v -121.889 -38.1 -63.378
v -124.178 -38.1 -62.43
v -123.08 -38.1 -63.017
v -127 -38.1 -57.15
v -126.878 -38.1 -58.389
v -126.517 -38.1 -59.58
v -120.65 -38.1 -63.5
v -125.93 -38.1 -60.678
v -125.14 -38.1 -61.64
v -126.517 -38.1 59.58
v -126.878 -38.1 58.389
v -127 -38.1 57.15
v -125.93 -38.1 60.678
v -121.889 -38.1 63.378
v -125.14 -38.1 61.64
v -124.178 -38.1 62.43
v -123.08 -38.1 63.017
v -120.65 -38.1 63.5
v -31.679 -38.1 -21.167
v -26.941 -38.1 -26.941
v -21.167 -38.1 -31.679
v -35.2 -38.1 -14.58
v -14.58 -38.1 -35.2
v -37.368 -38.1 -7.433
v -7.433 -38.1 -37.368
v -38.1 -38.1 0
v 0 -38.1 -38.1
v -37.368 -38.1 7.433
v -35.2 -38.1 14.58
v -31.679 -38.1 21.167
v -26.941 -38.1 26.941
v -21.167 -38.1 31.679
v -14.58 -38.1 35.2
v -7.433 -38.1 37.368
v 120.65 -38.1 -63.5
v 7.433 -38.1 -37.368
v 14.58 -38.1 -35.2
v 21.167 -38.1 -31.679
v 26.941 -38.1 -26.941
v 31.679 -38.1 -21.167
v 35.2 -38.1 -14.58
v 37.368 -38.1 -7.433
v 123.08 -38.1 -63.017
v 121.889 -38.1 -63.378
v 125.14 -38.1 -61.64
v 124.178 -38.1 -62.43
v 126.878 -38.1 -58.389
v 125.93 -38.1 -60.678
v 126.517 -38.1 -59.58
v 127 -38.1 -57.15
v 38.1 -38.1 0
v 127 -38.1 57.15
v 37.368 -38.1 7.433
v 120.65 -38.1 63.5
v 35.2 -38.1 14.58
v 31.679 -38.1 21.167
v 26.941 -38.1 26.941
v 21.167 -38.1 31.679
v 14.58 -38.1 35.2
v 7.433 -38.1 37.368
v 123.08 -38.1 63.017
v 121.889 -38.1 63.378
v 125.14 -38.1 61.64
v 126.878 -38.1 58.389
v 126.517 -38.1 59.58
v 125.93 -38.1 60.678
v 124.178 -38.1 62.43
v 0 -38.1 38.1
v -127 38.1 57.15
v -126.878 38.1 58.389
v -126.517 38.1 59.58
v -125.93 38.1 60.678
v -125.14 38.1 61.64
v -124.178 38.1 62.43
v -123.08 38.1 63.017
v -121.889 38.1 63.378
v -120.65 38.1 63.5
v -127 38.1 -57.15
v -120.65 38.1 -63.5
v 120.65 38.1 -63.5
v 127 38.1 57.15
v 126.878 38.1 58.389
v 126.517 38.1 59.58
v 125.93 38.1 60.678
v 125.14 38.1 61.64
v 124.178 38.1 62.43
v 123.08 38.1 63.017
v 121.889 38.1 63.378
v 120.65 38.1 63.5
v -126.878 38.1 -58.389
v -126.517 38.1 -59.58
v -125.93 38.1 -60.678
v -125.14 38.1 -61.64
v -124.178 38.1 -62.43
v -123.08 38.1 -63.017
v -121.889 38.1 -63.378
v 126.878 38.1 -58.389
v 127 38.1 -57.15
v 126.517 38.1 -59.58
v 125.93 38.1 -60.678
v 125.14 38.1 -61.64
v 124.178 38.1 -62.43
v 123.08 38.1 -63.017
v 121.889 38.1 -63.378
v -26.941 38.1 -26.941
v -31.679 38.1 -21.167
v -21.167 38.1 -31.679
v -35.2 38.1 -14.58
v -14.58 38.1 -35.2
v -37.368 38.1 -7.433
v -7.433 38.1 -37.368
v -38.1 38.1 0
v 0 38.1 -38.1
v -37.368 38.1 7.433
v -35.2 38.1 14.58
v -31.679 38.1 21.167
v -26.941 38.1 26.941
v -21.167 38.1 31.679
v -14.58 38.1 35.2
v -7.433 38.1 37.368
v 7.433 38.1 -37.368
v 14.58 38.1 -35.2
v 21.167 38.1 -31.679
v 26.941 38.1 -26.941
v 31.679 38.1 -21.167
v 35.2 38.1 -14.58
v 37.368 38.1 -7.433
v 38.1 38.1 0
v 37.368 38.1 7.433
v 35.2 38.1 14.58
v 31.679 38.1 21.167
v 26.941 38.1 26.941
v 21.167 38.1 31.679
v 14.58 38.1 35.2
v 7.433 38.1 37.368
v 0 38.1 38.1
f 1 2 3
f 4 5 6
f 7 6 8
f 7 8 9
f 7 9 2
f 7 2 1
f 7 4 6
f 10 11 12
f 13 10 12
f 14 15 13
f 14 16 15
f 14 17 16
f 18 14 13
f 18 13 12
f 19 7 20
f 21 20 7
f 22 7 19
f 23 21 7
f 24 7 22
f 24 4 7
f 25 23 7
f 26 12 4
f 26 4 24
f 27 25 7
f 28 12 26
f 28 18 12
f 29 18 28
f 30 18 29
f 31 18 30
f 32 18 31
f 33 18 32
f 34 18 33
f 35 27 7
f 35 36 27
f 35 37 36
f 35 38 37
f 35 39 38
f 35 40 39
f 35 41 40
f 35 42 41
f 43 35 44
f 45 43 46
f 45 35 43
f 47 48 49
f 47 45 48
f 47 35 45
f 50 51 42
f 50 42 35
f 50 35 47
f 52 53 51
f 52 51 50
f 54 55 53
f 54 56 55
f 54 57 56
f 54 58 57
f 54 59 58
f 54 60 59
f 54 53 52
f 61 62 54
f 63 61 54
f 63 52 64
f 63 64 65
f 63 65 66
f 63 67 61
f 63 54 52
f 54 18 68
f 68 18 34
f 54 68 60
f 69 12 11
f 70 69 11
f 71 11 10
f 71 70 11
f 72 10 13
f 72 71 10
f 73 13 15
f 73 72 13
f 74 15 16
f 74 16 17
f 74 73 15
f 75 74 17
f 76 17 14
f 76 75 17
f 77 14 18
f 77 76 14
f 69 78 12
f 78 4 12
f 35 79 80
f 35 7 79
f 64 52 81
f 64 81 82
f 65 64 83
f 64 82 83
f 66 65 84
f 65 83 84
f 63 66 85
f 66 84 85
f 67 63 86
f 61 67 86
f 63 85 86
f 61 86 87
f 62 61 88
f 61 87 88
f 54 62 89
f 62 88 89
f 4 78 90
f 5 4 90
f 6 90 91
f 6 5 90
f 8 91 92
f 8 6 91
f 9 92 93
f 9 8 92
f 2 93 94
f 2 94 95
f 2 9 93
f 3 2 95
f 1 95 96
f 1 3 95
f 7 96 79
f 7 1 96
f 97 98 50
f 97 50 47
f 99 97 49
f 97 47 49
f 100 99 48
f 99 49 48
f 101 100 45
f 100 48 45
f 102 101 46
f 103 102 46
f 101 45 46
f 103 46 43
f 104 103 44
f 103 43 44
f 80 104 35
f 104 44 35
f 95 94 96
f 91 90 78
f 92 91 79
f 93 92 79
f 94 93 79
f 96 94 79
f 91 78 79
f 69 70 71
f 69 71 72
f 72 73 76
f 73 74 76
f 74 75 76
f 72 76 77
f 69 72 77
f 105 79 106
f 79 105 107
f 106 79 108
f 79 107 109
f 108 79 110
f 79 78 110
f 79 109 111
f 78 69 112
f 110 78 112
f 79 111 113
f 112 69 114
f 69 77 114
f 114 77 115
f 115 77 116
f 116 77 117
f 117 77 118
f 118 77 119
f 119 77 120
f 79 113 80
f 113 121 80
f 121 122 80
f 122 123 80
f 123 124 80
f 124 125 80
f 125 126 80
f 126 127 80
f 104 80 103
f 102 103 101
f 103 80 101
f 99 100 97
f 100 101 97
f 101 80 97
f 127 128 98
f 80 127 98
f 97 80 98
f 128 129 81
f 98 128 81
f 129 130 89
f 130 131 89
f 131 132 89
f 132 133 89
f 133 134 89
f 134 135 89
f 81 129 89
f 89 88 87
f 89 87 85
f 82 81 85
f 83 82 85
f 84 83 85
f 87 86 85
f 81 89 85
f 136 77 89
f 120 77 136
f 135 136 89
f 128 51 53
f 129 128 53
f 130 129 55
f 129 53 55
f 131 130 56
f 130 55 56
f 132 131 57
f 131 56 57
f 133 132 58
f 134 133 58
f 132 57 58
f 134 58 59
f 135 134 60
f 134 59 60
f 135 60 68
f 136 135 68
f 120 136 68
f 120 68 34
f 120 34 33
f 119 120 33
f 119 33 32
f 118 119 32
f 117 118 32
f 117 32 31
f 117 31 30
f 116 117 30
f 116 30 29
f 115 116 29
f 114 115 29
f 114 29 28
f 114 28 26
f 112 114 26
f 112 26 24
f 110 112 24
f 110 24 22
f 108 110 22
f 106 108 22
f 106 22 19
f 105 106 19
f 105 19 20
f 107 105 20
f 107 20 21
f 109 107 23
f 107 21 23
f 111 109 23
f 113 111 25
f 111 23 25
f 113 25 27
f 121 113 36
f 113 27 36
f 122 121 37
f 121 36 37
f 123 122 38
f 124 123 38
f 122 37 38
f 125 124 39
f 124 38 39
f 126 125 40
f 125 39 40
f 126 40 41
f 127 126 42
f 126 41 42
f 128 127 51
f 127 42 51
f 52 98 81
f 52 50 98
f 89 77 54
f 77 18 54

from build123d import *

# Parameters (mm, degrees)
F0_W     = 254
F0_H     = 127
F1_DEPTH = 38.1
F2_R     = 6.35
F3_R     = 38.1
F4_DEPTH = 76.201


with BuildPart() as f1:
    # F0 (on Front) → F1 (new body, symmetric)
    with BuildSketch(Plane.XZ):
        Rectangle(F0_W, F0_H)
    extrude(amount=F1_DEPTH, both=True)

    # F2
    f2_edges = [f1.edges().sort_by_distance(p)[0] for p in [
        (-127, 0, 63.5),
        (127, 0, 63.5),
        (-127, 0, -63.5),
        (127, 0, -63.5),
    ]]
    fillet(f2_edges, radius=F2_R)

    # F3 (on face) → F4 (cut, through all)
    with BuildSketch(Plane.XZ.offset(38.1)):
        Circle(F3_R)
    extrude(amount=-F4_DEPTH, mode=Mode.SUBTRACT)


solid = f1.part
